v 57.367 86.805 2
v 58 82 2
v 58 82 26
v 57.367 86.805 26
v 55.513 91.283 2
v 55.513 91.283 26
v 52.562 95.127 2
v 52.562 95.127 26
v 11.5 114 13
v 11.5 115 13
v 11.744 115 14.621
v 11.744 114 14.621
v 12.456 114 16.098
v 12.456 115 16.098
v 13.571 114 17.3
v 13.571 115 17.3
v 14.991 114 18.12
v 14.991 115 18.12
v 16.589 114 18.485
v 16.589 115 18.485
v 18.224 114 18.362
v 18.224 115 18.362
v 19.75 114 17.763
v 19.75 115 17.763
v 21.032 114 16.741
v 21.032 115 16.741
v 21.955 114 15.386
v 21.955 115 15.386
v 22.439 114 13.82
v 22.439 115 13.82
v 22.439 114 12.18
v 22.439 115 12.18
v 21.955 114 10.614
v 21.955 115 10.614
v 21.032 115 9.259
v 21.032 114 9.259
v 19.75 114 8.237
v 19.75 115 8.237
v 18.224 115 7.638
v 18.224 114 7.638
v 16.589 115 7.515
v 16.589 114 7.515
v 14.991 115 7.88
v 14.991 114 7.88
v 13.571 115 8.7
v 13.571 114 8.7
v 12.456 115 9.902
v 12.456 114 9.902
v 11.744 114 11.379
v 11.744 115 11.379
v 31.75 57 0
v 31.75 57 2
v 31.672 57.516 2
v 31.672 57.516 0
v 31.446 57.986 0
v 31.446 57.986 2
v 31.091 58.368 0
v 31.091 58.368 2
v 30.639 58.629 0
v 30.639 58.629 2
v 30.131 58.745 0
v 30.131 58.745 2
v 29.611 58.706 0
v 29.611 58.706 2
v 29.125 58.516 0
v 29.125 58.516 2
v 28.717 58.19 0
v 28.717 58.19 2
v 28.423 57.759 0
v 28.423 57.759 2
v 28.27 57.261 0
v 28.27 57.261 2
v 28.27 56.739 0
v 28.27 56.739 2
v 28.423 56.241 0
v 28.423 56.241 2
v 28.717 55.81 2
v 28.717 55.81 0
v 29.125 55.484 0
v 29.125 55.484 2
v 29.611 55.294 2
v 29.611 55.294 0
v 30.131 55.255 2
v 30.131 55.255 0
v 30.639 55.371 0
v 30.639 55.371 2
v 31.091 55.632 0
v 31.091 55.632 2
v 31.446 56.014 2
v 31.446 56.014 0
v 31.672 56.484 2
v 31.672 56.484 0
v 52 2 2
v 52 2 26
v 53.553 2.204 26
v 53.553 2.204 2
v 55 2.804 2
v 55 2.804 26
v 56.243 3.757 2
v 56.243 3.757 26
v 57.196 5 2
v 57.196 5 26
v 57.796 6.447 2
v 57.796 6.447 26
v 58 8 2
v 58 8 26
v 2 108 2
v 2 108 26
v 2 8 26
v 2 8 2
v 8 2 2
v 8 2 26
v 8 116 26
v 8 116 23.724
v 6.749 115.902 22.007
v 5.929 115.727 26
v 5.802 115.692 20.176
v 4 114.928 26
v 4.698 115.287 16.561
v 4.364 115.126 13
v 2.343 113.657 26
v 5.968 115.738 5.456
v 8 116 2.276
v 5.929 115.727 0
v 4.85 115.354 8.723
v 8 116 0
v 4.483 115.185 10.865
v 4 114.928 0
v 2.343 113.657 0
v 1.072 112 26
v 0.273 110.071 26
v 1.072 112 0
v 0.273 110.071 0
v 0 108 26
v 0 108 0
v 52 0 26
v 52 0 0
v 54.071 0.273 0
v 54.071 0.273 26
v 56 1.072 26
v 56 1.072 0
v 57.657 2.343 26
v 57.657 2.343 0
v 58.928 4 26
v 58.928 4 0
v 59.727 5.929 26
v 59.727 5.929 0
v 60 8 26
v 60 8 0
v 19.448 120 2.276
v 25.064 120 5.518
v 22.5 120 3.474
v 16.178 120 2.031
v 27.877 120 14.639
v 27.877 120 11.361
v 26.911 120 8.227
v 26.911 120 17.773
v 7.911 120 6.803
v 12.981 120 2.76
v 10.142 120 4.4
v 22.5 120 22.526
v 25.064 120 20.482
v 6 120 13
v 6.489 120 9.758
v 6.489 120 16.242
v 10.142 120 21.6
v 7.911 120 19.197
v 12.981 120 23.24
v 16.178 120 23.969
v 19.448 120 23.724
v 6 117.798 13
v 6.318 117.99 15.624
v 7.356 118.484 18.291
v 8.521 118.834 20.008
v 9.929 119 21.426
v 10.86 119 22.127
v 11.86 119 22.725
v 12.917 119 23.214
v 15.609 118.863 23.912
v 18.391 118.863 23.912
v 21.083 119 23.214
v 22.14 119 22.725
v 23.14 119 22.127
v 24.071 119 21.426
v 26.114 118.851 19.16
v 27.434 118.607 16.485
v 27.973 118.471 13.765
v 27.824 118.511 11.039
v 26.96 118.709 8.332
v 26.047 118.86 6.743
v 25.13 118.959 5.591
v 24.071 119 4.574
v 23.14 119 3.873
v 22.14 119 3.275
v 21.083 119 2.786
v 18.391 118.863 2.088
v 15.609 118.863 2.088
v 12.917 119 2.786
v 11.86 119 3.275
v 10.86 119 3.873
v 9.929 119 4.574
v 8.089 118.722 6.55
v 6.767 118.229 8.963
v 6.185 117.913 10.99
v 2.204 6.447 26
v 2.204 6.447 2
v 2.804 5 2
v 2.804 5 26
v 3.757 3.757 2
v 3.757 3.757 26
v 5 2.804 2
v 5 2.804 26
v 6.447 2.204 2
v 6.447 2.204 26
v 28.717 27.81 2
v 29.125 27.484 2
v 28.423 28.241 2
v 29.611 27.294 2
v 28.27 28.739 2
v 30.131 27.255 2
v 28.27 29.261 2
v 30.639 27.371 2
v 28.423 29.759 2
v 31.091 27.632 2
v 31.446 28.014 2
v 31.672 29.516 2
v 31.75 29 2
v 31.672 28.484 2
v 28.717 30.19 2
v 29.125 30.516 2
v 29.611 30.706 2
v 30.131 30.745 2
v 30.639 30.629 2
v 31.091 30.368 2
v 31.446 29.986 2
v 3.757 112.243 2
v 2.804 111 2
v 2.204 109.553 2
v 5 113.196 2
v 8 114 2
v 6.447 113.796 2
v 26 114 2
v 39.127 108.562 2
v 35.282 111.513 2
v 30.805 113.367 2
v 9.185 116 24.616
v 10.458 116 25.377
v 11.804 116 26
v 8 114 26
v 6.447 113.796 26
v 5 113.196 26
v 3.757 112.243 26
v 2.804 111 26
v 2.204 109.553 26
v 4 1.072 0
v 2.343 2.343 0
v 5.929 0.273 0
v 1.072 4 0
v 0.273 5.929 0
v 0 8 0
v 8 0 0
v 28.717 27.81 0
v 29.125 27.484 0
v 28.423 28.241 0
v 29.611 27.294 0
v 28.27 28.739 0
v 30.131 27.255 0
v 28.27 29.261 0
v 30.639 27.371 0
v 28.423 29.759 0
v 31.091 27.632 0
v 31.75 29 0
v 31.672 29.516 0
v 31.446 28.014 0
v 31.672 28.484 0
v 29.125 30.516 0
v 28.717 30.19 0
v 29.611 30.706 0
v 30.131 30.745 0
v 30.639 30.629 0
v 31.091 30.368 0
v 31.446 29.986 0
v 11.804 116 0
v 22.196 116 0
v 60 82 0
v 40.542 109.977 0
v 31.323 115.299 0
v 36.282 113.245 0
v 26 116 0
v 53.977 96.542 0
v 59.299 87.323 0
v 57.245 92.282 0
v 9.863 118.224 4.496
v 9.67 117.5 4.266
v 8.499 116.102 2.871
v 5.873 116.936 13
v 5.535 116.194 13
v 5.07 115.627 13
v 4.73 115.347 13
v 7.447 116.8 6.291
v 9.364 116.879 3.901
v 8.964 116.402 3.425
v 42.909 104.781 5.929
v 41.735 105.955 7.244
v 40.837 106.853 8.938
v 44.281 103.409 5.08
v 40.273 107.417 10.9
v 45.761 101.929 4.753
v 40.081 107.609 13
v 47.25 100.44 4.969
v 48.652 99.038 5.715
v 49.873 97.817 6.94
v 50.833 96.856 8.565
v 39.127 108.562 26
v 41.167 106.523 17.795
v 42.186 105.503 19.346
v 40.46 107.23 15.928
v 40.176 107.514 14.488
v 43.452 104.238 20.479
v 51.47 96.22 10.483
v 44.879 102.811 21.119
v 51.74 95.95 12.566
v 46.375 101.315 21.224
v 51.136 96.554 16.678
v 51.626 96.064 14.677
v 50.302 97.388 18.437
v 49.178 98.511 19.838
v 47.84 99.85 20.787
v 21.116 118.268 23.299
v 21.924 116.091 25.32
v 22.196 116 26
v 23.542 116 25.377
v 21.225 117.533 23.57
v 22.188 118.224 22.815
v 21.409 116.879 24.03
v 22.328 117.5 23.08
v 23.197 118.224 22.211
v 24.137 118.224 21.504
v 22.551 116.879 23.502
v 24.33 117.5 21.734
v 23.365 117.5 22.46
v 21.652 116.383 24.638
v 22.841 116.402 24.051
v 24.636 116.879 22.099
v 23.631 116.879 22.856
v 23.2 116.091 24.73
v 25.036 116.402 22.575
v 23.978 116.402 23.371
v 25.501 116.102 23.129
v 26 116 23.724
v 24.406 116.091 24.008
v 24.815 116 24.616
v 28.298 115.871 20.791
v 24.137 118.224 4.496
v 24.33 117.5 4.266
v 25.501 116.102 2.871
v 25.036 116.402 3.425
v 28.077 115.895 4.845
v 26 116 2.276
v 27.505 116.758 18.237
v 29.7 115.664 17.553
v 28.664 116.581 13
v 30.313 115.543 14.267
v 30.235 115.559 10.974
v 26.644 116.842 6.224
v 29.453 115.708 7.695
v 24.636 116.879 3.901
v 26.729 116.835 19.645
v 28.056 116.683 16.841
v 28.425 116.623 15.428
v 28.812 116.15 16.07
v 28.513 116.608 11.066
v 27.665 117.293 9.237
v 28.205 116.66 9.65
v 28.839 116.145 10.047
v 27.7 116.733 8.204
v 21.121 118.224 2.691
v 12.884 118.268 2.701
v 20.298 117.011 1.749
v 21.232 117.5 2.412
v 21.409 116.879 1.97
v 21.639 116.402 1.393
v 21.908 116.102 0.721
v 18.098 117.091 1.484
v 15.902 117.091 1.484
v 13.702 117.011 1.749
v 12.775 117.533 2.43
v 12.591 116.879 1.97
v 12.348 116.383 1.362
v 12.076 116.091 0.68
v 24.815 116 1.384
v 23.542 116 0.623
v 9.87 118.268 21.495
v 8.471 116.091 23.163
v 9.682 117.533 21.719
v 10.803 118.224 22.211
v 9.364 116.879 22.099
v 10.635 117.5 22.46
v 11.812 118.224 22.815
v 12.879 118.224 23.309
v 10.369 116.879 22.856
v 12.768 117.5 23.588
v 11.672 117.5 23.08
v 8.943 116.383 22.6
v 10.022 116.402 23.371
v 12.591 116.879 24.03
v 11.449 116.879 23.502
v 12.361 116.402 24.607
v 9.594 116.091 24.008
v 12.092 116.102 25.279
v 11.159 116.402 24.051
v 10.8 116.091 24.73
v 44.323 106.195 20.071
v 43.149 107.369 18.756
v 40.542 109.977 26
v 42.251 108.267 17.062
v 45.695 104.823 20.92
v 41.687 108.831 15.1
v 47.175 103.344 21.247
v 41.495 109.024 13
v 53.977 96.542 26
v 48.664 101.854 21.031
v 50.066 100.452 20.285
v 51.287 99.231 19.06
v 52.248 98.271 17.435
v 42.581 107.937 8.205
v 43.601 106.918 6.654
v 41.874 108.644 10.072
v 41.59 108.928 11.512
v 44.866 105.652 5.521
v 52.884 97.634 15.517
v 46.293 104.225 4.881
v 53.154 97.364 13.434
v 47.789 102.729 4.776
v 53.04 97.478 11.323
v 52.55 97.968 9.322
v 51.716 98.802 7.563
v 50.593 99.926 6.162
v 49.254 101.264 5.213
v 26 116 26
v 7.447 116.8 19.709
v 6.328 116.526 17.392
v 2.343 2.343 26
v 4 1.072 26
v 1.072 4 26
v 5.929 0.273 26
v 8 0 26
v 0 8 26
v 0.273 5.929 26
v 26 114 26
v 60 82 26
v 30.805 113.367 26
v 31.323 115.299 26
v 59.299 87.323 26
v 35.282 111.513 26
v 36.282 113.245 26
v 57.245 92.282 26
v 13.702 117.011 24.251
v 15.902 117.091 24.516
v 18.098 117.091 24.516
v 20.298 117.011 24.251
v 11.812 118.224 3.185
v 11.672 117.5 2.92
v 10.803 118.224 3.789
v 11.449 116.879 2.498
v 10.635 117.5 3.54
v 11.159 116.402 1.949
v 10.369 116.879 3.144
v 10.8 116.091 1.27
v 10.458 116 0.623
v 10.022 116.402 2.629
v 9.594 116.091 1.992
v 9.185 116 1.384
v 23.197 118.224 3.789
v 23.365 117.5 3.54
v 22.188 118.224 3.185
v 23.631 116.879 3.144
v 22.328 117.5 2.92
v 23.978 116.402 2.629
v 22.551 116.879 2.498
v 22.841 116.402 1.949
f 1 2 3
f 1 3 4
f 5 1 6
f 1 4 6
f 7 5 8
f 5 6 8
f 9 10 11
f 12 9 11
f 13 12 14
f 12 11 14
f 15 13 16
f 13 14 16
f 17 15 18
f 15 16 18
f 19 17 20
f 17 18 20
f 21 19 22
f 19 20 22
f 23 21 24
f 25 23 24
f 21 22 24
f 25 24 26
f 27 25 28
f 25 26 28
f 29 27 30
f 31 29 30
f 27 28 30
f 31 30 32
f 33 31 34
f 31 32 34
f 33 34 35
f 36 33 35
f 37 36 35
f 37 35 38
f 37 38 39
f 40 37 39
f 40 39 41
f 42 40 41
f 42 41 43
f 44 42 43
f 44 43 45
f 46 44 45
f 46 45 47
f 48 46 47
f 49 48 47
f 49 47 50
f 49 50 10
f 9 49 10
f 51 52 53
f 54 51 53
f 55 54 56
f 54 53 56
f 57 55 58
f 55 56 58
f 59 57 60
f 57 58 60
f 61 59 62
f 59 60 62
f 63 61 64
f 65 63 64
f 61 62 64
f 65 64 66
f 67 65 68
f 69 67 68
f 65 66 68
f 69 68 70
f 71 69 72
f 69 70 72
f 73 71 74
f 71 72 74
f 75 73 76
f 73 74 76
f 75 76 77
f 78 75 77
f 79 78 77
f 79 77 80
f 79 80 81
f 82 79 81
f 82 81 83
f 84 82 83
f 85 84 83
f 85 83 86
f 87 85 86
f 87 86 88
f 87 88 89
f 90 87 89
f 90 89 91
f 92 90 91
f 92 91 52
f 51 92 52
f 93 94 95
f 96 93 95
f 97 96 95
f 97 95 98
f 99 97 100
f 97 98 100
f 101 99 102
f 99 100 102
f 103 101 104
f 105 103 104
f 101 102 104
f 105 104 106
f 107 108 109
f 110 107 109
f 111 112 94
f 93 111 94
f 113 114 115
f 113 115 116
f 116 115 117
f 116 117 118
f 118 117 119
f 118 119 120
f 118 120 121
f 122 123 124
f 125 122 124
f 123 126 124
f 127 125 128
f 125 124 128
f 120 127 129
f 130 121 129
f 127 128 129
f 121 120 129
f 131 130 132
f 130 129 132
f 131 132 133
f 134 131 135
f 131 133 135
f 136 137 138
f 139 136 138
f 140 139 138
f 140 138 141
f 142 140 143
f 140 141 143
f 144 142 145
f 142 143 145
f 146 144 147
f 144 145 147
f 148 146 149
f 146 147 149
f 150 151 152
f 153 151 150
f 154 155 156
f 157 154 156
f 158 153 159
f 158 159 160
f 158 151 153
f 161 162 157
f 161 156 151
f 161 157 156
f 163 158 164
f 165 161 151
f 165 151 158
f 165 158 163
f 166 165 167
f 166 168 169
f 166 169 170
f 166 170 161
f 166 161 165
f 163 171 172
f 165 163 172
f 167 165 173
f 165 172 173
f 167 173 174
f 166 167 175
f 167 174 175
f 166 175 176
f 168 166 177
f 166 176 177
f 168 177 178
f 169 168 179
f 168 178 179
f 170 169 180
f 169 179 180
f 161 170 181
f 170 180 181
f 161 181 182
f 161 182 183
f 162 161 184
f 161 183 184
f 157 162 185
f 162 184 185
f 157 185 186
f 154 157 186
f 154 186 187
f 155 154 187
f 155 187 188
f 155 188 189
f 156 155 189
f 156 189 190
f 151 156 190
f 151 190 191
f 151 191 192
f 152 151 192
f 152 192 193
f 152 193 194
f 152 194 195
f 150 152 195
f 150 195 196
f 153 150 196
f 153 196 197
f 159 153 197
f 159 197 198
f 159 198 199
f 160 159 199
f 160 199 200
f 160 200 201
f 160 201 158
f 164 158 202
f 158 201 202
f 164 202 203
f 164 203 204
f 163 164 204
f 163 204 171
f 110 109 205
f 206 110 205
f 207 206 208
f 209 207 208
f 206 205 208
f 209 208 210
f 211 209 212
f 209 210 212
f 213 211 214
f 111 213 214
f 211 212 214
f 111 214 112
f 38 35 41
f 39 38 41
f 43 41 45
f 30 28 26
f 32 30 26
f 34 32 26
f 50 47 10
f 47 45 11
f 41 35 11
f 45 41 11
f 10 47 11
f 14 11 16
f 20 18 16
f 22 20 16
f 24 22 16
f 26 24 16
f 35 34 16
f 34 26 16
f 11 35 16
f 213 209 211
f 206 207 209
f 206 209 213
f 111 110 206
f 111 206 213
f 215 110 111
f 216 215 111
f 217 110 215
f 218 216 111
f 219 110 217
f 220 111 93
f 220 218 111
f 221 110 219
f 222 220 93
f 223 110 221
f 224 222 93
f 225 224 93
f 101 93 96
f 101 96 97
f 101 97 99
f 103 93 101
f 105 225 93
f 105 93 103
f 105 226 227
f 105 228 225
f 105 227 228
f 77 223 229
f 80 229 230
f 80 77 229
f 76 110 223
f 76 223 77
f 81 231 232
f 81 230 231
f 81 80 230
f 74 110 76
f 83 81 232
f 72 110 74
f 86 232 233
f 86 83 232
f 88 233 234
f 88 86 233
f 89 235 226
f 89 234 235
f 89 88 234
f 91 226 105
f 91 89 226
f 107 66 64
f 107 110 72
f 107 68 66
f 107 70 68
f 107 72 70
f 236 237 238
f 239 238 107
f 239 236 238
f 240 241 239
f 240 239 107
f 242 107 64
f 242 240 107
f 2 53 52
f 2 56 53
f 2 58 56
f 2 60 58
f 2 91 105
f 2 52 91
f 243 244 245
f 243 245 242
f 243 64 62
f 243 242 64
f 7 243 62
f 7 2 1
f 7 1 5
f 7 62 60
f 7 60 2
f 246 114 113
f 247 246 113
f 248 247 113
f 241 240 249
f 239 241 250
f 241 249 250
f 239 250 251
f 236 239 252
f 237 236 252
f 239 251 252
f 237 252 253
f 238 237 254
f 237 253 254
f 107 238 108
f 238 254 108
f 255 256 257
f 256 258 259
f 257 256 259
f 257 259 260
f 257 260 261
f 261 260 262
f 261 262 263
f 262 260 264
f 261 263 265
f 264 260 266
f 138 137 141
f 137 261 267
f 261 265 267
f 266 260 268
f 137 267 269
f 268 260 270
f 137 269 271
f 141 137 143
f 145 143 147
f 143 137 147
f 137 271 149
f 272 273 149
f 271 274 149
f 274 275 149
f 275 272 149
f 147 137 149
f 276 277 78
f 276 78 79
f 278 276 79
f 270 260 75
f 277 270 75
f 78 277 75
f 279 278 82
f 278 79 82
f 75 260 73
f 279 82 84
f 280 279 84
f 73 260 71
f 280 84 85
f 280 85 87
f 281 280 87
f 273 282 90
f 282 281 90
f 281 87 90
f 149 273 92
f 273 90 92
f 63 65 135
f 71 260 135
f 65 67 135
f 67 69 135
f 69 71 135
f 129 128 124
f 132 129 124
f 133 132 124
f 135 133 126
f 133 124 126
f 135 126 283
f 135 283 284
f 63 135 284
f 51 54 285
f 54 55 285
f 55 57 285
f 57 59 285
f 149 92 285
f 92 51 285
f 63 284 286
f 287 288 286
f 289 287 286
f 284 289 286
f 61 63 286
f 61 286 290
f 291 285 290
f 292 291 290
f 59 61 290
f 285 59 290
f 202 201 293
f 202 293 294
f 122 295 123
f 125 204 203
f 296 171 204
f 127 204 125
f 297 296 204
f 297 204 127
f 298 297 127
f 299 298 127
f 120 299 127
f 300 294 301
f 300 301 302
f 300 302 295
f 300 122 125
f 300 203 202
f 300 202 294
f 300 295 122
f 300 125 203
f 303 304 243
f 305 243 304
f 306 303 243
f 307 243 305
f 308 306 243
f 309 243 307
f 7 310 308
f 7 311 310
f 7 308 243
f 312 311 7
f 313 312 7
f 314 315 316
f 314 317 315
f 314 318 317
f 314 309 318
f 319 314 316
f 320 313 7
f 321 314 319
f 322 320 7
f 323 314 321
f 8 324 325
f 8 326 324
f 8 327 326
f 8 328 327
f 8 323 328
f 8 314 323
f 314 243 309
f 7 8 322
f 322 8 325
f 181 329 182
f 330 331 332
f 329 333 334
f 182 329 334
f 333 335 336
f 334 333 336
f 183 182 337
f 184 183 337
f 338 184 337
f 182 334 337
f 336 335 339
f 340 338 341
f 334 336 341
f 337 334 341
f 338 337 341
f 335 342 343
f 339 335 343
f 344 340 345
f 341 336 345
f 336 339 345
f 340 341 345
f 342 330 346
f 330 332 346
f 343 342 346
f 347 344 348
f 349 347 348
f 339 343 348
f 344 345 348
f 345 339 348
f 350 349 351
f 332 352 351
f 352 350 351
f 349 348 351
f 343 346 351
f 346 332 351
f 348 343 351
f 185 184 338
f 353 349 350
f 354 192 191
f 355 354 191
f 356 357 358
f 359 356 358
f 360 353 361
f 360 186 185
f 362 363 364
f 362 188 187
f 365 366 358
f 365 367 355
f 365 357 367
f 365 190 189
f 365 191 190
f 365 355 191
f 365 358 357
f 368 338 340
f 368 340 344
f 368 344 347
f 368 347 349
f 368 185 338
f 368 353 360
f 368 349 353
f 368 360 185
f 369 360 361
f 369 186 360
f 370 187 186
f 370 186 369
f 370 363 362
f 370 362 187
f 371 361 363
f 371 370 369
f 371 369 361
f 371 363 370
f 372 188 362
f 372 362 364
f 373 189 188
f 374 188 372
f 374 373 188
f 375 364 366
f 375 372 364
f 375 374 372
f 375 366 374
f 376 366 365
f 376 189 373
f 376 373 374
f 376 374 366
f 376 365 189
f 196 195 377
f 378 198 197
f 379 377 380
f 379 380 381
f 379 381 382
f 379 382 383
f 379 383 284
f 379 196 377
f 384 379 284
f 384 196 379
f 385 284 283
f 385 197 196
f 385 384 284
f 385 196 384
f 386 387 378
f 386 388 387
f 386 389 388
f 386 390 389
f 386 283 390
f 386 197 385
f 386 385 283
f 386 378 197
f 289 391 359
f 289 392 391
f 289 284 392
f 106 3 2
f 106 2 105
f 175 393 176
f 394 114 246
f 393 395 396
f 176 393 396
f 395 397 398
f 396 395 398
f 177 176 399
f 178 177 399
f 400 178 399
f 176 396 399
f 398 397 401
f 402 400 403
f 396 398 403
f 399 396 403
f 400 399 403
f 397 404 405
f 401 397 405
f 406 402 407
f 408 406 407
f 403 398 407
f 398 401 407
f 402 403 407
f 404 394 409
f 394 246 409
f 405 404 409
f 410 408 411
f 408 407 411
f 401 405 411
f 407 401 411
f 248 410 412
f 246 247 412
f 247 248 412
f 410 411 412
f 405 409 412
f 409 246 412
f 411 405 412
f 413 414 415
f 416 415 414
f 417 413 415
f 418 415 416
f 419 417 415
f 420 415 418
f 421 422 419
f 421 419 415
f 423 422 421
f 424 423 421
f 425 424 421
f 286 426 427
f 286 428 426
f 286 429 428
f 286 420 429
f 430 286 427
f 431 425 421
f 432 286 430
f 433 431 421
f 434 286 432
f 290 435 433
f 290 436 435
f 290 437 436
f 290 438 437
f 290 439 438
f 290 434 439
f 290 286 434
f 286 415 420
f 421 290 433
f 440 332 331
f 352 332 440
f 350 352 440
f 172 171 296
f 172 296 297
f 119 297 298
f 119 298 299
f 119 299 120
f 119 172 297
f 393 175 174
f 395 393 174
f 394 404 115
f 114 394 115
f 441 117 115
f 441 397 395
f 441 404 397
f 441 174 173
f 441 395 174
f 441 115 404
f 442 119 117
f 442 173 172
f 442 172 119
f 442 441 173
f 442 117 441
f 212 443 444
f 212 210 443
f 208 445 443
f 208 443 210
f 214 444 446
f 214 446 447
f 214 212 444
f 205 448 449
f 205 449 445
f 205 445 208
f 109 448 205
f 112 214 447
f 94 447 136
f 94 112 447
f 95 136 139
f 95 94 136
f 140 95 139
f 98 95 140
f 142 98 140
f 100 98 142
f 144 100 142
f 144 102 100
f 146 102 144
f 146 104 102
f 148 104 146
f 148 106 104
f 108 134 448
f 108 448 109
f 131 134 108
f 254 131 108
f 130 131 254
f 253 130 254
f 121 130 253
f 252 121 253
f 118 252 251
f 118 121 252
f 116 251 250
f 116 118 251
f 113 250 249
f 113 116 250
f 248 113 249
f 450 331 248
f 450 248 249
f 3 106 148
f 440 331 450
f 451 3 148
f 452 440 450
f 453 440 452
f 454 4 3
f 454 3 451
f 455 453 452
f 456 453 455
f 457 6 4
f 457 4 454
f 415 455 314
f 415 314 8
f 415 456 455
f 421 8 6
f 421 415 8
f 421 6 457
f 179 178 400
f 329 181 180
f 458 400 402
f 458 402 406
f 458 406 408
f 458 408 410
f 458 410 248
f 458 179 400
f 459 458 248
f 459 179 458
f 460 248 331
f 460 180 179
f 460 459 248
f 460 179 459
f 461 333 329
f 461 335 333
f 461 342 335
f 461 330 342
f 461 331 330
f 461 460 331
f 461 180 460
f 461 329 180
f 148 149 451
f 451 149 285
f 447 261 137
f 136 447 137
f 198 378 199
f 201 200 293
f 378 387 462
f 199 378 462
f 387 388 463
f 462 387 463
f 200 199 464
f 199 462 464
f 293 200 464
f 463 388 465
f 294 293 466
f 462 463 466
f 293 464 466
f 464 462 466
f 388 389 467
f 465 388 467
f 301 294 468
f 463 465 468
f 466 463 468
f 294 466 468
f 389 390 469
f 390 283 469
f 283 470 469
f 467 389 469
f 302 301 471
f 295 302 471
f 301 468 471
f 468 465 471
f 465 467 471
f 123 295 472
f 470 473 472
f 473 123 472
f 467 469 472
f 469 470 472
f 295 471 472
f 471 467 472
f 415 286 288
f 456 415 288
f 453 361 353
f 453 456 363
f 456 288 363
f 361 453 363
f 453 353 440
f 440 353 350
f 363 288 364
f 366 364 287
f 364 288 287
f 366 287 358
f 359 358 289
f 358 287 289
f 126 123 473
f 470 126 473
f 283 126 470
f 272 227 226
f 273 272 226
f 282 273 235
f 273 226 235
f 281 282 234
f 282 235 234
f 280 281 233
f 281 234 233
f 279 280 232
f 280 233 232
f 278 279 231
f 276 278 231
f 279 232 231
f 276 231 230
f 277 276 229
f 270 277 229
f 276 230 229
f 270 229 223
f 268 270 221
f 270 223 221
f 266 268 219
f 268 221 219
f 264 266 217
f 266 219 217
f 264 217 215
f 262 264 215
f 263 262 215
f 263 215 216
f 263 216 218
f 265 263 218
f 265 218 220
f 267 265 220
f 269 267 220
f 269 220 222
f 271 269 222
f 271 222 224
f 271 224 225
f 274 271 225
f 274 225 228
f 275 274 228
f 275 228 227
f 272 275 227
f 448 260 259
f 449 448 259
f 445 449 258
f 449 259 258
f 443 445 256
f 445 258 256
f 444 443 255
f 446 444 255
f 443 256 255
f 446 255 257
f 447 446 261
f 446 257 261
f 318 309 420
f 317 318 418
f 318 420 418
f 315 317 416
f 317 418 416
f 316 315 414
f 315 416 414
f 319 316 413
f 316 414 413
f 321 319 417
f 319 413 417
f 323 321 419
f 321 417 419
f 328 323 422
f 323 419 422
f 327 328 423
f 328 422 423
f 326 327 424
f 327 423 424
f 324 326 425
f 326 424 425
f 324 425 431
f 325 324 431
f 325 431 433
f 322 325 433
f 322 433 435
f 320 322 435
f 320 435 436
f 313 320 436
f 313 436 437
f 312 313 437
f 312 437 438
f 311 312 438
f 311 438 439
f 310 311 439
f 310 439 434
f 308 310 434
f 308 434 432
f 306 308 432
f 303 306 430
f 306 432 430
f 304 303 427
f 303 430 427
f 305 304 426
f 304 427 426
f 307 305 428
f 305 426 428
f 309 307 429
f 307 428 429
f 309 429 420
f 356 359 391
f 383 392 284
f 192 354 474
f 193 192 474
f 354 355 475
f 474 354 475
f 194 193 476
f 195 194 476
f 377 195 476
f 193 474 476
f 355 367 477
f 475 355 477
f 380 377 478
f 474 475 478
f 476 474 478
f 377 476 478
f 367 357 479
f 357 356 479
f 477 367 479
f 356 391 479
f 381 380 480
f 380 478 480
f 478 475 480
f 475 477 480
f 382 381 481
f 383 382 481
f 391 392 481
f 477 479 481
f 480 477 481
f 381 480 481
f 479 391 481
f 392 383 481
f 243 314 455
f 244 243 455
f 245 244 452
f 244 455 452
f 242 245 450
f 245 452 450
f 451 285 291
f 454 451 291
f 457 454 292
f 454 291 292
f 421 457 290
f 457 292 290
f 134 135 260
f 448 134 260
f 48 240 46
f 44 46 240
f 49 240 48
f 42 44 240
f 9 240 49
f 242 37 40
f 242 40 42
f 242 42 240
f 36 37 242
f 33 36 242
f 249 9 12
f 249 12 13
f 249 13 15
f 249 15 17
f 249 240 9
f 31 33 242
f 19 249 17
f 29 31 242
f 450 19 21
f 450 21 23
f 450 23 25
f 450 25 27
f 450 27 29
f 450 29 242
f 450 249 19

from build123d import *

# Parameters (mm, degrees)
PAD_DEPTH       = 26
POCKET_DEPTH    = 24
SKETCH002_R     = 8.25
POCKET001_DEPTH = 3
SKETCH003_R     = 5.5
POCKET002_DEPTH = 3
SKETCH004_R     = 1.75
POCKET003_DEPTH = 5
SKETCH005_R     = 11
POCKET004_DEPTH = 1
SKETCH006_R     = 11
PAD001_DEPTH    = 5
FILLET_R        = 3


with BuildPart() as part:
    # Sketch → Pad (new body)
    with BuildSketch(Plane.XY):
        with BuildLine():
            Line((60, 8), (60, 82.000001))
            ThreePointArc((60, 82.000001), (58.434586, 89.869877), (53.976662, 96.541638))
            Line((40.541631, 109.976664), (53.976662, 96.541638))
            ThreePointArc((40.541631, 109.976664), (33.869872, 114.434584), (25.999999, 115.999997))
            Line((7.999999, 115.999997), (25.999999, 115.999997))
            ThreePointArc((7.999999, 115.999997), (2.343146, 113.656851), (0, 107.999998))
            Line((0, 107.999998), (0, 8))
            ThreePointArc((0, 8), (2.343146, 2.343146), (8, 0))
            Line((8, 0), (52, 0))
            ThreePointArc((52, 0), (57.656854, 2.343146), (60, 8))
        make_face()
    extrude(amount=PAD_DEPTH)

    # Sketch001 → Pocket (cut)
    with BuildSketch(Plane.XY.offset(26)):
        with BuildLine():
            ThreePointArc((8.00001, 113.999998), (3.757363, 112.242642), (2, 107.999998))
            Line((2, 107.999998), (2, 8))
            ThreePointArc((2, 8), (3.757359, 3.757359), (8, 2))
            Line((8, 2), (52, 2))
            ThreePointArc((52, 2), (56.242642, 3.757359), (58.000001, 8))
            Line((58.000001, 82), (58.000001, 8))
            ThreePointArc((58.000001, 82), (56.586824, 89.104519), (52.562435, 95.127438))
            Line((39.127419, 108.562437), (52.562435, 95.127438))
            ThreePointArc((39.127419, 108.562437), (33.104503, 112.586822), (25.99999, 113.999998))
            Line((8.00001, 113.999998), (25.99999, 113.999998))
        make_face()
    extrude(amount=-POCKET_DEPTH, mode=Mode.SUBTRACT)

    # Sketch002 → Pocket001 (cut)
    with BuildSketch(Plane(origin=(75.259141, 75.259166, 0), x_dir=(-0.707107, 0.707107, 0), z_dir=(0.707107, 0.707107, 0))):
        with Locations((39.5, 13)):
            Circle(SKETCH002_R)
    extrude(amount=-POCKET001_DEPTH, mode=Mode.SUBTRACT)

    # Sketch003 → Pocket002 (cut)
    with BuildSketch(Plane(origin=(0, 115.999997, 0), x_dir=(-1, 0, 0), z_dir=(0, 1, 0))):
        with Locations((-17, 13)):
            Circle(SKETCH003_R)
    extrude(amount=-POCKET002_DEPTH, mode=Mode.SUBTRACT)

    # Sketch004 → Pocket003 (cut)
    with BuildSketch(Plane.XY.offset(2)):
        with Locations((30, 29)):
            Circle(SKETCH004_R)
        with Locations((30, 57)):
            Circle(SKETCH004_R)
    extrude(amount=-POCKET003_DEPTH, mode=Mode.SUBTRACT)

    # Sketch005 → Pocket004 (cut)
    with BuildSketch(Plane(origin=(0, 115.999997, 0), x_dir=(-1, 0, 0), z_dir=(0, 1, 0))):
        with Locations((-17, 13)):
            Circle(SKETCH005_R)
    extrude(amount=-POCKET004_DEPTH, mode=Mode.SUBTRACT)

    # Sketch006 → Pad001 (new body)
    with BuildSketch(Plane(origin=(0, 114.999997, 0), x_dir=(-1, 0, 0), z_dir=(0, 1, 0))):
        with Locations((-17, 13)):
            Circle(SKETCH006_R)
    extrude(amount=PAD001_DEPTH)

    # Fillet
    fillet_edges = [part.edges().sort_by_distance(p)[0] for p in [
        (16.999999, 115.999997, 2),
        (28, 115.902514, 12.999999),
        (6.512058, 115.860406, 9.682926),
        (6.512058, 115.860406, 16.317074),
        (16.999999, 115.999997, 24),
    ]]
    fillet(fillet_edges, radius=FILLET_R)


solid = part.part
